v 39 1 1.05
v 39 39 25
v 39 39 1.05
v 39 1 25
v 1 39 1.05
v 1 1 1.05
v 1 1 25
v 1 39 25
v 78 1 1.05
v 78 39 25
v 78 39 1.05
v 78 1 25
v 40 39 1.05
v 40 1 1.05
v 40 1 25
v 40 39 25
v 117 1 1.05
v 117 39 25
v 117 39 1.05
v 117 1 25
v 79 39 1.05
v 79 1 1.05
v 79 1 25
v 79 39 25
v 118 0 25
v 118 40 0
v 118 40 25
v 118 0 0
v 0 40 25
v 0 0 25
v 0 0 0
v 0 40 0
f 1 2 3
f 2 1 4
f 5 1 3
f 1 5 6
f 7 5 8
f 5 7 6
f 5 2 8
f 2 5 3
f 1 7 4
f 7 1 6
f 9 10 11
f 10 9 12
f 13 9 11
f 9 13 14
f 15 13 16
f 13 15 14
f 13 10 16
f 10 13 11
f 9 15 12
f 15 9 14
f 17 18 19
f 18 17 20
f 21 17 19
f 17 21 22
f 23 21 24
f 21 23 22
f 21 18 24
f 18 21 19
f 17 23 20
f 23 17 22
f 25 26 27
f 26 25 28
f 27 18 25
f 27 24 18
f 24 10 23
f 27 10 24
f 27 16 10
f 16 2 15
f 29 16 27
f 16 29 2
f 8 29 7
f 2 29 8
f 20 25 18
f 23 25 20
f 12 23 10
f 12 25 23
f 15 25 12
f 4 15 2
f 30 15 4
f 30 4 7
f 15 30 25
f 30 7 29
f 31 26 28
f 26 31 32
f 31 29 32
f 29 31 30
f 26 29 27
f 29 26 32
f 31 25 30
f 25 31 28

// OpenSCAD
// core vars
total_w=118; //mm
box_p_row=3; //amount of boxes per ro
box_wall_th=1; // mm width of the boxes wall
box_wall_h=25; //mm height of outer box walls
box_bot_th=1; // mm thickness of bottom 
smidg=0.05;

//calcs
walls_p_row=box_p_row+1;
box_wall_total_th=box_wall_th*walls_p_row;
total_inner_w=total_w-box_wall_total_th;
box_iw=total_inner_w/box_p_row;
box_ow=box_iw+box_wall_th*2;
box_h=box_ow;
box_wall_ih=box_wall_h-box_bot_th;
box_ih=box_h-box_wall_th*2;


echo("<b>aaa</b>");
echo("total width",total_w);
echo("walls per row", walls_p_row);
echo("total inner width(boxes)",total_inner_w);
echo("<b>aaa</b>");

difference(){
   cube([total_w,box_h,box_wall_h]);  
	for(c=[0:box_p_row-1])
	{   
   	translate([c*(box_ow-box_wall_th)+box_wall_th,box_wall_th,box_bot_th+smidg])
		    cube([box_iw,box_ih,box_wall_ih]);	

	}
}

//cylinder(h=my_h, r=my_r);
//
